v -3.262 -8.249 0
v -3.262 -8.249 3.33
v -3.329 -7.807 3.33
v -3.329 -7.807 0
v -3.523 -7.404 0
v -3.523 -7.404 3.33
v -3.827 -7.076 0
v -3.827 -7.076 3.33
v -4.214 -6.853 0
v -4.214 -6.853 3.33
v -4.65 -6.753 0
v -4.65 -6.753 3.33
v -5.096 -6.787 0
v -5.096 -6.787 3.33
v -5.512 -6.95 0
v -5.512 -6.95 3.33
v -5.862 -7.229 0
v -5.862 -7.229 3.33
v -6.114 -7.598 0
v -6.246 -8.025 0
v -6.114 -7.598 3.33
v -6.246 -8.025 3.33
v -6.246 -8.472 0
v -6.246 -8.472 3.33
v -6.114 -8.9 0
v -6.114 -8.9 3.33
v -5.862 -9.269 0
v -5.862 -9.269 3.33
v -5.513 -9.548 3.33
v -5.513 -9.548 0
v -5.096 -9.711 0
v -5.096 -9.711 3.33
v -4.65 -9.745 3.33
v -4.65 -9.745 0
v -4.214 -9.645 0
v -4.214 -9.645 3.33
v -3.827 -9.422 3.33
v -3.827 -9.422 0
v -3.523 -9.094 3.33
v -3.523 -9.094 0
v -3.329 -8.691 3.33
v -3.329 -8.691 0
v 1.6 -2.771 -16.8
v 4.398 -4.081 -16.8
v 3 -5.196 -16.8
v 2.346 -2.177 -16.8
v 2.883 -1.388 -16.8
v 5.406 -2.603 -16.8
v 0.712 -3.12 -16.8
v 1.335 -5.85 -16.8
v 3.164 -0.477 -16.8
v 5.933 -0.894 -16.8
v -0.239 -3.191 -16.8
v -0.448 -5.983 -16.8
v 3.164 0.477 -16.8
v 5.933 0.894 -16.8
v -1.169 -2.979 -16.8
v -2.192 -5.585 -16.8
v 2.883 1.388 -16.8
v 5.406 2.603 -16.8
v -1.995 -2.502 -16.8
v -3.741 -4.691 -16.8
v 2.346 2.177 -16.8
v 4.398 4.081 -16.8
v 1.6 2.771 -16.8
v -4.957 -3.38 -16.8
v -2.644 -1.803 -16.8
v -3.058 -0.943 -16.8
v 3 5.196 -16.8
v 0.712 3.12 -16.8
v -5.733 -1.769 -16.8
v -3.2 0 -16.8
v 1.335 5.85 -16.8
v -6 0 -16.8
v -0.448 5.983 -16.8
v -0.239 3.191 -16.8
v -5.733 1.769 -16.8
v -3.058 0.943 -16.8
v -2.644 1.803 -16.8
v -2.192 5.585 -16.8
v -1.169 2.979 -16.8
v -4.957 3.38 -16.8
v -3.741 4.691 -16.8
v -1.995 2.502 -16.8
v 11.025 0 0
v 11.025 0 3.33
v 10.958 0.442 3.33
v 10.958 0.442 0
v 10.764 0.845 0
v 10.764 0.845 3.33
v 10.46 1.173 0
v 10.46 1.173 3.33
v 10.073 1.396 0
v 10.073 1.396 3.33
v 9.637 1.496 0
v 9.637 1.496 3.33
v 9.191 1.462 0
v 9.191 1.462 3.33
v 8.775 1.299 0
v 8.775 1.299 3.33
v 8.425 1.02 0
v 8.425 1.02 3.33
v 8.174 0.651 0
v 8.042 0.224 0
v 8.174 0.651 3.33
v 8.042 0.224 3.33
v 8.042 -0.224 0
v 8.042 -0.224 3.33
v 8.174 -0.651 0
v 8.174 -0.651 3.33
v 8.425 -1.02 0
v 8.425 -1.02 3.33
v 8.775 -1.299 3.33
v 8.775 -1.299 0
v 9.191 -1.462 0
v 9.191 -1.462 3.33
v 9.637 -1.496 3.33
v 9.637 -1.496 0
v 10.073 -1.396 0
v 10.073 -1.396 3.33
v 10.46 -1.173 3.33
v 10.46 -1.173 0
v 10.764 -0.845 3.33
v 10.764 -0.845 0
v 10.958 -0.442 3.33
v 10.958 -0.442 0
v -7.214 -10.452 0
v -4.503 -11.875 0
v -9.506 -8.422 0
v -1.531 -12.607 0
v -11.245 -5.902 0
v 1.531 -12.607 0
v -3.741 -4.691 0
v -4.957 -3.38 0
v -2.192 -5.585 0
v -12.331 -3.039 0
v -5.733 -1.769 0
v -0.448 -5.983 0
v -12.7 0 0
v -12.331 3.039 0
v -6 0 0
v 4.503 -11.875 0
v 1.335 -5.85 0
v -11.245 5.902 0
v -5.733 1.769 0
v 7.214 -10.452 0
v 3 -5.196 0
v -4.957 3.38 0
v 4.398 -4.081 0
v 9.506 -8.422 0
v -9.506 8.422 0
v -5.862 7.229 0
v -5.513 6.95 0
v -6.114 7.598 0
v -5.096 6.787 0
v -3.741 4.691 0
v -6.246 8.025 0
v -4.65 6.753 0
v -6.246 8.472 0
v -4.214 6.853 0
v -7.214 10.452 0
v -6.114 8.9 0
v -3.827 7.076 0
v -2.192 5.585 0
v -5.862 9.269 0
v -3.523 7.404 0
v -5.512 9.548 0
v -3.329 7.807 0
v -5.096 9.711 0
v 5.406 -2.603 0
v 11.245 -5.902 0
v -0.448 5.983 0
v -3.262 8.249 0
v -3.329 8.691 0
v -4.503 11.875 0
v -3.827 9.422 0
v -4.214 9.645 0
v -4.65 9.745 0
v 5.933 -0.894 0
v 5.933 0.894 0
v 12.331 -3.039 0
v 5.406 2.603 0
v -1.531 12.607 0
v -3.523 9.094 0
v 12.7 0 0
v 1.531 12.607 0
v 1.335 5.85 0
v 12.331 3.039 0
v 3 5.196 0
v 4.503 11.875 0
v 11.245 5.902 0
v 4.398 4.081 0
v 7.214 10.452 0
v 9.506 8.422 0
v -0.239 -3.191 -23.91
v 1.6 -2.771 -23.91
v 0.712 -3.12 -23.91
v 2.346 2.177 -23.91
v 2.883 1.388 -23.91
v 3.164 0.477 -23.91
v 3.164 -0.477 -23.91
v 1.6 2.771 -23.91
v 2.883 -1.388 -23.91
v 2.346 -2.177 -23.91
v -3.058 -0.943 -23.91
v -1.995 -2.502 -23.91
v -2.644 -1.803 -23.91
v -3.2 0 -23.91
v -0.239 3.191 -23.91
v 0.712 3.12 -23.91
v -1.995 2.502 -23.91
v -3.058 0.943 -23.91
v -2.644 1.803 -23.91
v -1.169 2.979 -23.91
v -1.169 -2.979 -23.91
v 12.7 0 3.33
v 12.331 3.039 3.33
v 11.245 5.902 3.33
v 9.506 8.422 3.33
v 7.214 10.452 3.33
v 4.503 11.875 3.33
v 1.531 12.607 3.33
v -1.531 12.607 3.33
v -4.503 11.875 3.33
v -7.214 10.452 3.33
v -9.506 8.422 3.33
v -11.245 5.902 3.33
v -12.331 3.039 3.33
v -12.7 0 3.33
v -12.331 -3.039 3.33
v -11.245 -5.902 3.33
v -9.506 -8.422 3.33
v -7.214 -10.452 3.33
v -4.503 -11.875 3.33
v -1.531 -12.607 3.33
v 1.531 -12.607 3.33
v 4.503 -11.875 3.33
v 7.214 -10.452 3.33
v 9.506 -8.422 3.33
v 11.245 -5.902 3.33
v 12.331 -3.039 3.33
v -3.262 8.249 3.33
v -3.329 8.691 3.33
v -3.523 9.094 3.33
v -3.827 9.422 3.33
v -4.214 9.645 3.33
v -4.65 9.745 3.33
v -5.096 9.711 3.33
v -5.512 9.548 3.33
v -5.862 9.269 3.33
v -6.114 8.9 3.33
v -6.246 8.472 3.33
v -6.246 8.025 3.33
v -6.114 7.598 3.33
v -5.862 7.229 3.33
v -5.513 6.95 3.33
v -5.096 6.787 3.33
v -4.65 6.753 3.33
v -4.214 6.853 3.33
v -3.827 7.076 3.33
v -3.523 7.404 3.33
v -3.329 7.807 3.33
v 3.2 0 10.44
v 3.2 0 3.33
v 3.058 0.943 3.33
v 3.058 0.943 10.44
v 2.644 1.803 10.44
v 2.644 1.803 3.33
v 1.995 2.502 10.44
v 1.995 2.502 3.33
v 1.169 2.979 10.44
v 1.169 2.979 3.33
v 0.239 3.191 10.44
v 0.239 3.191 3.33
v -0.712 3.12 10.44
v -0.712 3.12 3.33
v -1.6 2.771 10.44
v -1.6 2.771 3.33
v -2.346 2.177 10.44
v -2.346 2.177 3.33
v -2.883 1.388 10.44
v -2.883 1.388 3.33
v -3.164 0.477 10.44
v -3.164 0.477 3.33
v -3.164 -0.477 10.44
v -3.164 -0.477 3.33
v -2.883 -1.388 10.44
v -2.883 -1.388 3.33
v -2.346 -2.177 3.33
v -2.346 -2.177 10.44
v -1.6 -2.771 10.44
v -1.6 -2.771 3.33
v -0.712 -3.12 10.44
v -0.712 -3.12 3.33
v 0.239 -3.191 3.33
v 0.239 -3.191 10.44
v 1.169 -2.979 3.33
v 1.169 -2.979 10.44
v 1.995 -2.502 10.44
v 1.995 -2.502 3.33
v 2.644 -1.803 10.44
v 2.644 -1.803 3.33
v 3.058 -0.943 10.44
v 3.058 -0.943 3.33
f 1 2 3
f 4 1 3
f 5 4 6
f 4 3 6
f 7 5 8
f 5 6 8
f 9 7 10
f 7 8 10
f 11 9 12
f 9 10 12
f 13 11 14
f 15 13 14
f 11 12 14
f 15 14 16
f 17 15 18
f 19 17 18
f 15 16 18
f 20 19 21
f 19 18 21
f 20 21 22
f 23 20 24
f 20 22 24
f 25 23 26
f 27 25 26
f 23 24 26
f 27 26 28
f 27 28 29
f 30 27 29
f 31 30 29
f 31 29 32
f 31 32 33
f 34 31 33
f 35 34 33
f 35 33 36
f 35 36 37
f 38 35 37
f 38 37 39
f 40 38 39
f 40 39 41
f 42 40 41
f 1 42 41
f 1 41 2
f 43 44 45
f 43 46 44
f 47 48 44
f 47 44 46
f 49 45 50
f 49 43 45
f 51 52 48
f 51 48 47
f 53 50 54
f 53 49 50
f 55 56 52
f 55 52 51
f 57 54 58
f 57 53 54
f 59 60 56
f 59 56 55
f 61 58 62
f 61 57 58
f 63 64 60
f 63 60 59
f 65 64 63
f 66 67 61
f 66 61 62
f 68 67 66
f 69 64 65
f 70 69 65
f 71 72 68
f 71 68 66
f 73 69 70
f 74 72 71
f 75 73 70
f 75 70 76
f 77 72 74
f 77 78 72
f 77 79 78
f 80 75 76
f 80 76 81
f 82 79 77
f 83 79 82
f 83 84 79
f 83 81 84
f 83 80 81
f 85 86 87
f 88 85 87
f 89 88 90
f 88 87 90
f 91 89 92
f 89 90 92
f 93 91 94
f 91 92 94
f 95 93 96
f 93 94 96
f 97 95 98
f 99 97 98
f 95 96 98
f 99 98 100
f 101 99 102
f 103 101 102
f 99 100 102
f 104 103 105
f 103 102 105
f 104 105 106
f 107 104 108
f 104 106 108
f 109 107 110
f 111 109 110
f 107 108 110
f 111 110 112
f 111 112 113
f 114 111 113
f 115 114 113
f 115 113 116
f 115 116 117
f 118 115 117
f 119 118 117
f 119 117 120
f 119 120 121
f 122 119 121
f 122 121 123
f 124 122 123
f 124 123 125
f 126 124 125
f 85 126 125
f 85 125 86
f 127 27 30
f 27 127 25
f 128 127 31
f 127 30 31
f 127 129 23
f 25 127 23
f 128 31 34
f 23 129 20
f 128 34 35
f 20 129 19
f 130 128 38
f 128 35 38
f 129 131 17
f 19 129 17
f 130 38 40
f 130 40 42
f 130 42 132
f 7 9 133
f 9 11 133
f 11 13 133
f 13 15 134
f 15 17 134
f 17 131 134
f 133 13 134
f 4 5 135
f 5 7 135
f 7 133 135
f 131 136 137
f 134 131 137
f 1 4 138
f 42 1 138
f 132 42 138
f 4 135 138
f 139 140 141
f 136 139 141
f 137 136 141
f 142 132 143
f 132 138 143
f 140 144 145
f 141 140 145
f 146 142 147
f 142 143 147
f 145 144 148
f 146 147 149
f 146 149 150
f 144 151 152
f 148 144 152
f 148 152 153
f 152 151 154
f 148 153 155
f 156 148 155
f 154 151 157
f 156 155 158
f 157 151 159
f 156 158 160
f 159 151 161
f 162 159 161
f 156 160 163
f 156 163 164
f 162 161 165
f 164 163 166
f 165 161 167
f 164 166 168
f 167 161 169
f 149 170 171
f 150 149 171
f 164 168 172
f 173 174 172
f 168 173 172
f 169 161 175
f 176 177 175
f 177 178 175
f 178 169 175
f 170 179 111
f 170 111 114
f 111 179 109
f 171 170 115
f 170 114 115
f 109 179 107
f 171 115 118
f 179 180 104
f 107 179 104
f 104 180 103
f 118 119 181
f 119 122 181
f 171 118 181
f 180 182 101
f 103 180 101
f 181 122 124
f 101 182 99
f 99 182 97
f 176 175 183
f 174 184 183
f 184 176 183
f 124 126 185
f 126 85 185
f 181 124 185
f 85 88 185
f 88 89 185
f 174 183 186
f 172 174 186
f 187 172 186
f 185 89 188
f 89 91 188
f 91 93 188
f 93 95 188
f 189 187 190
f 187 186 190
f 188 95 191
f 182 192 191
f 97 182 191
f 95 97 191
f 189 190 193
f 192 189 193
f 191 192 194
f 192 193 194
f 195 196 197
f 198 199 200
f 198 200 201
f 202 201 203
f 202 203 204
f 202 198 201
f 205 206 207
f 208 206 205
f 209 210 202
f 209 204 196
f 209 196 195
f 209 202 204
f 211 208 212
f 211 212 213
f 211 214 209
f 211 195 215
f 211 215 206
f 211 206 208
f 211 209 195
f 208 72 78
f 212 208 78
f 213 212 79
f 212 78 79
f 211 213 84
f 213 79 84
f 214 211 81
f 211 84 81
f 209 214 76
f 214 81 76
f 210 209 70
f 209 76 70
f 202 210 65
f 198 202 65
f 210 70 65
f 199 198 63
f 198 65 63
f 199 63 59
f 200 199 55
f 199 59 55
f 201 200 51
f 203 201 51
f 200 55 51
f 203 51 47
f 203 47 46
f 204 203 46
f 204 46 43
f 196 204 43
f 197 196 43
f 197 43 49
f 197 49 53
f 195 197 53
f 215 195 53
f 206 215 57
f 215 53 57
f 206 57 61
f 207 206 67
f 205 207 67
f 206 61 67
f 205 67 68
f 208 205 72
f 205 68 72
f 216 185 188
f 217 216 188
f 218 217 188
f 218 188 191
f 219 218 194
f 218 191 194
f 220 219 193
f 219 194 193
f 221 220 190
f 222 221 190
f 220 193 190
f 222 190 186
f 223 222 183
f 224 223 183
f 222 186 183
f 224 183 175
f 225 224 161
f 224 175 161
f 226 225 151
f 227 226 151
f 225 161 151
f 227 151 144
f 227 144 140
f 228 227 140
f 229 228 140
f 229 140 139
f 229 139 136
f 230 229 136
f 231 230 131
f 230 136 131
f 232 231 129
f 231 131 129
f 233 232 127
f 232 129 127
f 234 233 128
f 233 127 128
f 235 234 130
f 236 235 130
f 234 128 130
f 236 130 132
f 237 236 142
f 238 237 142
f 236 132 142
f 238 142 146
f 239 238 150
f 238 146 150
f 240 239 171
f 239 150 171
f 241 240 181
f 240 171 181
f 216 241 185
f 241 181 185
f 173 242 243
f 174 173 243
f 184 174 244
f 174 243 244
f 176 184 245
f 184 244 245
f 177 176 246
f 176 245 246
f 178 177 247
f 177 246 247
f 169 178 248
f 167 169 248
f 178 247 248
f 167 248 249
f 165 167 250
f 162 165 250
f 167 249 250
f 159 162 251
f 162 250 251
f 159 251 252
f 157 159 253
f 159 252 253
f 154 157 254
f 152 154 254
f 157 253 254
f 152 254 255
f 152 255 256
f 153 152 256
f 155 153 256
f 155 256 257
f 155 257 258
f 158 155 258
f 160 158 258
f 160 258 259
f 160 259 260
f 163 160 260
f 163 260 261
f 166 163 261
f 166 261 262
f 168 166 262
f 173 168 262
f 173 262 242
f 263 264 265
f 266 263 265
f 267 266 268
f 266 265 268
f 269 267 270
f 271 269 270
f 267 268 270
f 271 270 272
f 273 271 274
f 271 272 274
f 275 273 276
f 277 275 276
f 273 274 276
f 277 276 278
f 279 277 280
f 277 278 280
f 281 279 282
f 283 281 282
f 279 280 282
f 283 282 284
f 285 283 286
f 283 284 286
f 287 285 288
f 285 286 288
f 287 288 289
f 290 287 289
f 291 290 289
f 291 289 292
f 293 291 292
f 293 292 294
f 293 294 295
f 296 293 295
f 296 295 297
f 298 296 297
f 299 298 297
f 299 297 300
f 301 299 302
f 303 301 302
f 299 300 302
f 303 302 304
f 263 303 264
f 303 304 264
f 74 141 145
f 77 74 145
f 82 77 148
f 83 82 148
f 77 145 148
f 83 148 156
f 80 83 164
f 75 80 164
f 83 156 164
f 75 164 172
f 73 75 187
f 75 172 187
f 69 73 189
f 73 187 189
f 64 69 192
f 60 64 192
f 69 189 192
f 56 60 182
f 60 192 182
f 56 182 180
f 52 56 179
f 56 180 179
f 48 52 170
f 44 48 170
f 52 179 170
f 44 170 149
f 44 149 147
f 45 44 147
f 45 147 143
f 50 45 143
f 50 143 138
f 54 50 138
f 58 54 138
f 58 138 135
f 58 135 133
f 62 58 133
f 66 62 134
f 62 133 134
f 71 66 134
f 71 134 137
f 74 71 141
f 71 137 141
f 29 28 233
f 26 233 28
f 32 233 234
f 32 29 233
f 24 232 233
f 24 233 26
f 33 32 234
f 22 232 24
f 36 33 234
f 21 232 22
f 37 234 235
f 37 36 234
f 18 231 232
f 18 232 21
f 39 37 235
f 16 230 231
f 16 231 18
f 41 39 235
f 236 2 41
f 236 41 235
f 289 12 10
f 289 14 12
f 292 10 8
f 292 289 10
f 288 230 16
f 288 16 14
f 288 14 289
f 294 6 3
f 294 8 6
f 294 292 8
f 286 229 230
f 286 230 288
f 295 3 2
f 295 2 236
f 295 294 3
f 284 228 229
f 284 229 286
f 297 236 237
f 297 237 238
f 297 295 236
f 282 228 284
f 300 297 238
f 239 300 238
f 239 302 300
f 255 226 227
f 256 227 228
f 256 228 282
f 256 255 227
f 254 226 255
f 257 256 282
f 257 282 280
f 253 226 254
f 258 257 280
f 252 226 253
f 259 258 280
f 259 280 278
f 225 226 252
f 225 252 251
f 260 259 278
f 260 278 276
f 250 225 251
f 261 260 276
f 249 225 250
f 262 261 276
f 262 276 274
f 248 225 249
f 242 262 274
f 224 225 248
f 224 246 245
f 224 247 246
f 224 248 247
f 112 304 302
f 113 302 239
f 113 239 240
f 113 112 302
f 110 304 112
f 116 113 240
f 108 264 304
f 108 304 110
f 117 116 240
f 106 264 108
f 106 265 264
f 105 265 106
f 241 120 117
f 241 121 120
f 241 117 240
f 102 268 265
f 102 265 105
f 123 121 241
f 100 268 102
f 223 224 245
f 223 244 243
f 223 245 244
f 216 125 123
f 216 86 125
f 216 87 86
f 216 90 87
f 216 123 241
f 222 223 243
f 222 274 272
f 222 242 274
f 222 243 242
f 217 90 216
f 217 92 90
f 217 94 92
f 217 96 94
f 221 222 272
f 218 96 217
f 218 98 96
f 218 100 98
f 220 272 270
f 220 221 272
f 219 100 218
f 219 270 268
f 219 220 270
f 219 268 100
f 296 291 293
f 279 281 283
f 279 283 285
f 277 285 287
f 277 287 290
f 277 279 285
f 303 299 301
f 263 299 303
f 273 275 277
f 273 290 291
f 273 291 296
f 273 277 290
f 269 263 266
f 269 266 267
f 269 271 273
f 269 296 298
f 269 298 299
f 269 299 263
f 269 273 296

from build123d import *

# Parameters (mm, degrees)
SKETCH1_R           = 12.7
BOSS_EXTRUDE1_DEPTH = 3.33
SKETCH2_R           = 3.2
BOSS_EXTRUDE2_DEPTH = 7.11
SKETCH3_R           = 6
BOSS_EXTRUDE3_DEPTH = 16.8
SKETCH4_R           = 3.2
BOSS_EXTRUDE4_DEPTH = 7.11
SKETCH5_R           = 1.5
CUT_EXTRUDE1_DEPTH  = 7.11


with BuildPart() as part:
    # Sketch1 → Boss-Extrude1 (new body)
    with BuildSketch(Plane.XY):
        Circle(SKETCH1_R)
    extrude(amount=BOSS_EXTRUDE1_DEPTH)

    # Sketch2 → Boss-Extrude2 (add)
    with BuildSketch(Plane.XY.offset(3.33)):
        Circle(SKETCH2_R)
    extrude(amount=BOSS_EXTRUDE2_DEPTH)

    # Sketch3 → Boss-Extrude3 (add)
    with BuildSketch(Plane(origin=(0, 0, 0), x_dir=(-1, 0, 0), z_dir=(0, 0, -1))):
        Circle(SKETCH3_R)
    extrude(amount=BOSS_EXTRUDE3_DEPTH)

    # Sketch4 → Boss-Extrude4 (add)
    with BuildSketch(Plane(origin=(0, 0, -16.8), x_dir=(-1, 0, 0), z_dir=(0, 0, -1))):
        Circle(SKETCH4_R)
    extrude(amount=BOSS_EXTRUDE4_DEPTH)

    # Sketch5 → Cut-Extrude1 (cut)
    with BuildSketch(Plane.XY.offset(3.33)):
        with Locations((9.525, 0)):
            Circle(SKETCH5_R)
        with Locations((-4.7625, -8.248891971)):
            Circle(SKETCH5_R)
        with Locations((-4.7625, 8.248891971)):
            Circle(SKETCH5_R)
    extrude(amount=-CUT_EXTRUDE1_DEPTH, mode=Mode.SUBTRACT)


solid = part.part
